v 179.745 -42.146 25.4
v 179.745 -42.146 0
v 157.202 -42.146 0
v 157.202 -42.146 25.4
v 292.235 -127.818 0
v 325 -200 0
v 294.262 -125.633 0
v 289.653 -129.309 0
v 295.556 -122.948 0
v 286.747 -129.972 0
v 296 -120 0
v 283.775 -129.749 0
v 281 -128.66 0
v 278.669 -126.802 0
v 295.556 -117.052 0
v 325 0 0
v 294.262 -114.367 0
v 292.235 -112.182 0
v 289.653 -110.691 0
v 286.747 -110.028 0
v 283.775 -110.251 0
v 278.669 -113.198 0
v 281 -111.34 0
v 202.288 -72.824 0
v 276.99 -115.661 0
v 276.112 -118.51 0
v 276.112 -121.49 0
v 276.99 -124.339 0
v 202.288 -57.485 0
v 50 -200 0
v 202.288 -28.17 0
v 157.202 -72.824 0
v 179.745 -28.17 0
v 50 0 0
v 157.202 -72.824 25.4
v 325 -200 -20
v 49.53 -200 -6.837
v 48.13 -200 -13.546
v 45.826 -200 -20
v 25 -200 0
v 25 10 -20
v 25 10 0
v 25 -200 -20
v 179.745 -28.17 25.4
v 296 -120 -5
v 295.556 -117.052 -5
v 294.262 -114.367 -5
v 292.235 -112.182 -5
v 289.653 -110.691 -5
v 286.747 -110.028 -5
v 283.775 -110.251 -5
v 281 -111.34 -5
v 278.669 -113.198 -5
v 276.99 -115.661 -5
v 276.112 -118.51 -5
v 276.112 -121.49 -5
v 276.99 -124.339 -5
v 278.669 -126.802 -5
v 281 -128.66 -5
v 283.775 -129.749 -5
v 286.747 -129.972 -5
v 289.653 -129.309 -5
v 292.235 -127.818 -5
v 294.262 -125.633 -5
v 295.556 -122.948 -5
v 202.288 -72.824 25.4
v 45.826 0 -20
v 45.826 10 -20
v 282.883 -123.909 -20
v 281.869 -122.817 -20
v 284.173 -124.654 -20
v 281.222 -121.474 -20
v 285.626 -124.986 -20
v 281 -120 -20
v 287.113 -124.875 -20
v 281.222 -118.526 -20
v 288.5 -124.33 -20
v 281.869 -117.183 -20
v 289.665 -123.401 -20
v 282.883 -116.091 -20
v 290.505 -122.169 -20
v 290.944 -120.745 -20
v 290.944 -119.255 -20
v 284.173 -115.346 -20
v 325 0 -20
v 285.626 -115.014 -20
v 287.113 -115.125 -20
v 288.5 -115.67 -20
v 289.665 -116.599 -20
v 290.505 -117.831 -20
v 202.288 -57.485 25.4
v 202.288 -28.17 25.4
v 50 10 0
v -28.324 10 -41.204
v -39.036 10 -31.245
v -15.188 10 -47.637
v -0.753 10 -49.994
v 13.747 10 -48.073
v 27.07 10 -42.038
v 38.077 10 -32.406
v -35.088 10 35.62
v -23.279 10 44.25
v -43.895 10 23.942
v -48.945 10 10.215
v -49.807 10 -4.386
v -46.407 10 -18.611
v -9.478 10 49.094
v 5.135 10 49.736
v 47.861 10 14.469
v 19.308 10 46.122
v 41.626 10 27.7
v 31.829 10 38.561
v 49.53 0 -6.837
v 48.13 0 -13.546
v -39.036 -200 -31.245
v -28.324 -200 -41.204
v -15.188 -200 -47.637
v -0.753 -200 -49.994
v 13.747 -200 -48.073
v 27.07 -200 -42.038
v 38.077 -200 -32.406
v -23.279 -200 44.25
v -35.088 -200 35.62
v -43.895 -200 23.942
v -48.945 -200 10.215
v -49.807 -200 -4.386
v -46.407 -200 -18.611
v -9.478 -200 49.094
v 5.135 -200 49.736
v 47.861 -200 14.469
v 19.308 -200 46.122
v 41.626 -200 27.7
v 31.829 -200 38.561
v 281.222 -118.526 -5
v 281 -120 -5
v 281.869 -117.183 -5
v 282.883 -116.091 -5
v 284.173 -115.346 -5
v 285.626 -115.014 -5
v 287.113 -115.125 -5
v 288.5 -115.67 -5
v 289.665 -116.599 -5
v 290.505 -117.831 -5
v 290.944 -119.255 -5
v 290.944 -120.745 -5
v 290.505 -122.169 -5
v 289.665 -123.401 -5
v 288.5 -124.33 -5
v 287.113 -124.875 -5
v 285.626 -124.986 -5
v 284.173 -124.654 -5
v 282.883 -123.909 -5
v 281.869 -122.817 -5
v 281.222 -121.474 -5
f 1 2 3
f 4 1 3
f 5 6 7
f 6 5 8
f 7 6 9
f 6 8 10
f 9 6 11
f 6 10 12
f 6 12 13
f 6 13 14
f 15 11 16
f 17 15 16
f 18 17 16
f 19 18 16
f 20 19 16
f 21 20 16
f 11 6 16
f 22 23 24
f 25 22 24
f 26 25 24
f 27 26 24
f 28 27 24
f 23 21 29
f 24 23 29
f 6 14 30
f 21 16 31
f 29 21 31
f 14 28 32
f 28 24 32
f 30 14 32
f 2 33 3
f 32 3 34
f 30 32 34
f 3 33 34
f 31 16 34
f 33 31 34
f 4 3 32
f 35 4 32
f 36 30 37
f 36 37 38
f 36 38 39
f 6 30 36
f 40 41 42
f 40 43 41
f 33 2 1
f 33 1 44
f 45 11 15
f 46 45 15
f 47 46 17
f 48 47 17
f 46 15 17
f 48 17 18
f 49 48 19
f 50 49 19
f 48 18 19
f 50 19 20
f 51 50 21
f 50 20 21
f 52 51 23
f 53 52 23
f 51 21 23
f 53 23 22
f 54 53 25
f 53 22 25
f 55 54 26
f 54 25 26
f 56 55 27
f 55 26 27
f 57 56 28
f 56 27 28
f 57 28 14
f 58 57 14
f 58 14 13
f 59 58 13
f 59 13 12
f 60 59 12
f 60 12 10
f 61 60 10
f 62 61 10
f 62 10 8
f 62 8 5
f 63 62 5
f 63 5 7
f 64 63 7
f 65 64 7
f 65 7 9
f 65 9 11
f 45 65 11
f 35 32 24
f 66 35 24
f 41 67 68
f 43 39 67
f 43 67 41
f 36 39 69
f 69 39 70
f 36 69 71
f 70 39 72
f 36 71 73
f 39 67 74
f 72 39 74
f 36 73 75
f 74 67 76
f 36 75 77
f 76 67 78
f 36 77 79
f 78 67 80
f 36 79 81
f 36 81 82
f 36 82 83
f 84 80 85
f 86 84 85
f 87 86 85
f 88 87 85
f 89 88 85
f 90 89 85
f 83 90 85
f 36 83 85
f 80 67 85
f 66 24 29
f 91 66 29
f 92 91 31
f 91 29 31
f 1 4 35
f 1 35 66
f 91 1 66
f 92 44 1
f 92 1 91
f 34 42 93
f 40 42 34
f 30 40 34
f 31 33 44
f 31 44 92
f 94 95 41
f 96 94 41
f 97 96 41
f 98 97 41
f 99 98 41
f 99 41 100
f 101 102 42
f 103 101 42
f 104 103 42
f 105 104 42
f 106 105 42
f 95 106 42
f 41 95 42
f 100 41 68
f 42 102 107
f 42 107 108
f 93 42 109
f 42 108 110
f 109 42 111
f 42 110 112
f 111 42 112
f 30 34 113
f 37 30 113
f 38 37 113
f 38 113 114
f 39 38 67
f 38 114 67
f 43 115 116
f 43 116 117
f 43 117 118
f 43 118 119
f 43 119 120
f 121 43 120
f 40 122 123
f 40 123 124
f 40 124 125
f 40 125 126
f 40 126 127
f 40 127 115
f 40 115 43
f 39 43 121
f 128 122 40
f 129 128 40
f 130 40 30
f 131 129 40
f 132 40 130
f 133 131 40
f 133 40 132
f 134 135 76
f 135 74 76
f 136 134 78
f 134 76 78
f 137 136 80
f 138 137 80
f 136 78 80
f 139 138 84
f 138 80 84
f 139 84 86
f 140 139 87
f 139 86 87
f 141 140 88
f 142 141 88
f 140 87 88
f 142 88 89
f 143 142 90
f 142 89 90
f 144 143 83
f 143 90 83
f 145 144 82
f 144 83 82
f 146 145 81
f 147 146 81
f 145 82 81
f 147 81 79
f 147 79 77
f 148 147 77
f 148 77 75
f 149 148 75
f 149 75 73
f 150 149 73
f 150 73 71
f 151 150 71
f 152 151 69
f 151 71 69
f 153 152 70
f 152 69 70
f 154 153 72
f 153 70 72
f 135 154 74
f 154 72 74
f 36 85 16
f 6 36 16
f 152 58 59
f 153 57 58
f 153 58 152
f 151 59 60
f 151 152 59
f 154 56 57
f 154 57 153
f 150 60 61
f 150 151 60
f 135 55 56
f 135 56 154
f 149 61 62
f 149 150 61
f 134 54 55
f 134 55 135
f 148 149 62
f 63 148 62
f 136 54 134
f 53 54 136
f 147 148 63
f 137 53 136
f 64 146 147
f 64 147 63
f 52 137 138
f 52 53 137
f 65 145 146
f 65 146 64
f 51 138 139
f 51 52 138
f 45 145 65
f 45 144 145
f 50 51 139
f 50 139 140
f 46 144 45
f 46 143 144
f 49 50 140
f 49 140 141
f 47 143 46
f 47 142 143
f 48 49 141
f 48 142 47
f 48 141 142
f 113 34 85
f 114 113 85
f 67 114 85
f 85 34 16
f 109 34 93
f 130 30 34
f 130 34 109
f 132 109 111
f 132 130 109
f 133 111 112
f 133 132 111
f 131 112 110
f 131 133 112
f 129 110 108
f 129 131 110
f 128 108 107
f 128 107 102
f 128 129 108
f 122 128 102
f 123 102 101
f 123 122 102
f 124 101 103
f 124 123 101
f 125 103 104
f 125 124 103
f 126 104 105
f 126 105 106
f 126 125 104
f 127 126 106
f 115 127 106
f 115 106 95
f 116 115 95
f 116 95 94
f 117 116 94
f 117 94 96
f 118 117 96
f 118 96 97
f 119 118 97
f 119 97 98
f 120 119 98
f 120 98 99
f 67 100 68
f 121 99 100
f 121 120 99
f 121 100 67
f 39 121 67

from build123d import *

# Parameters (mm, degrees)
F1_DEPTH       = 200
F2_DEPTH       = 10
F4_D           = 10
F4_CBORE_D     = 20
F4_CBORE_DEPTH = 5
F5_W           = 22.5431323051
F5_H           = 15.3391379863
F5_H_2         = 13.9755383134
F6_DEPTH       = 25.4


with BuildPart() as f1:
    # F0 (on Front) → F1 (new body)
    with BuildSketch(Plane.XZ):
        with BuildLine():
            Line((25, 0), (50, 0))
            ThreePointArc((50, 0), (-48.9453156465, 10.2154821845), (45.8257569496, -20))
            Line((45.8257569496, -20), (25, -20))
            Line((25, -20), (25, 0))
        make_face()
    extrude(amount=F1_DEPTH)

    # F2 (add): a face of the model
    f2_faces = [f1.faces().sort_by_distance(p)[0] for p in [
        (-2.3595573385, 0, 0.6216546396),
    ]]


with BuildPart() as f1b:
    # F0 (on Front) → F1, piece 2 (new body)
    with BuildSketch(Plane.XZ):
        with BuildLine():
            Line((325, 0), (50, 0))
            ThreePointArc((50, 0), (48.9453156465, -10.2154821845), (45.8257569496, -20))
            Line((45.8257569496, -20), (325, -20))
            Line((325, -20), (325, 0))
        make_face()
    extrude(amount=F1_DEPTH)


with BuildPart() as f1_1:
    add(f1.part)

    add(f1b.part)  # F2 merges F1b
    extrude(f2_faces, amount=F2_DEPTH)

    # F4 (through all)
    with Locations(Plane.XY):
        with Locations((286, -120)):
            CounterBoreHole(F4_D / 2, F4_CBORE_D / 2, F4_CBORE_DEPTH)

    # F5 (on face) → F6 (join)
    with BuildSketch(Plane.XY):
        Polygon((157.201975584, -42.1456806362), (157.201975584, -72.8239566088), (202.2882401943, -72.8239566088), (202.2882401943, -57.4848186225), (179.7451078892, -57.4848186225), (179.7451078892, -42.1456806362), align=None)
        with Locations((191.0166740417, -49.8152496293)):
            Rectangle(F5_W, F5_H)
        with Locations((191.0166740417, -35.1579114795)):
            Rectangle(F5_W, F5_H_2)
    extrude(amount=F6_DEPTH)


solid = f1_1.part
